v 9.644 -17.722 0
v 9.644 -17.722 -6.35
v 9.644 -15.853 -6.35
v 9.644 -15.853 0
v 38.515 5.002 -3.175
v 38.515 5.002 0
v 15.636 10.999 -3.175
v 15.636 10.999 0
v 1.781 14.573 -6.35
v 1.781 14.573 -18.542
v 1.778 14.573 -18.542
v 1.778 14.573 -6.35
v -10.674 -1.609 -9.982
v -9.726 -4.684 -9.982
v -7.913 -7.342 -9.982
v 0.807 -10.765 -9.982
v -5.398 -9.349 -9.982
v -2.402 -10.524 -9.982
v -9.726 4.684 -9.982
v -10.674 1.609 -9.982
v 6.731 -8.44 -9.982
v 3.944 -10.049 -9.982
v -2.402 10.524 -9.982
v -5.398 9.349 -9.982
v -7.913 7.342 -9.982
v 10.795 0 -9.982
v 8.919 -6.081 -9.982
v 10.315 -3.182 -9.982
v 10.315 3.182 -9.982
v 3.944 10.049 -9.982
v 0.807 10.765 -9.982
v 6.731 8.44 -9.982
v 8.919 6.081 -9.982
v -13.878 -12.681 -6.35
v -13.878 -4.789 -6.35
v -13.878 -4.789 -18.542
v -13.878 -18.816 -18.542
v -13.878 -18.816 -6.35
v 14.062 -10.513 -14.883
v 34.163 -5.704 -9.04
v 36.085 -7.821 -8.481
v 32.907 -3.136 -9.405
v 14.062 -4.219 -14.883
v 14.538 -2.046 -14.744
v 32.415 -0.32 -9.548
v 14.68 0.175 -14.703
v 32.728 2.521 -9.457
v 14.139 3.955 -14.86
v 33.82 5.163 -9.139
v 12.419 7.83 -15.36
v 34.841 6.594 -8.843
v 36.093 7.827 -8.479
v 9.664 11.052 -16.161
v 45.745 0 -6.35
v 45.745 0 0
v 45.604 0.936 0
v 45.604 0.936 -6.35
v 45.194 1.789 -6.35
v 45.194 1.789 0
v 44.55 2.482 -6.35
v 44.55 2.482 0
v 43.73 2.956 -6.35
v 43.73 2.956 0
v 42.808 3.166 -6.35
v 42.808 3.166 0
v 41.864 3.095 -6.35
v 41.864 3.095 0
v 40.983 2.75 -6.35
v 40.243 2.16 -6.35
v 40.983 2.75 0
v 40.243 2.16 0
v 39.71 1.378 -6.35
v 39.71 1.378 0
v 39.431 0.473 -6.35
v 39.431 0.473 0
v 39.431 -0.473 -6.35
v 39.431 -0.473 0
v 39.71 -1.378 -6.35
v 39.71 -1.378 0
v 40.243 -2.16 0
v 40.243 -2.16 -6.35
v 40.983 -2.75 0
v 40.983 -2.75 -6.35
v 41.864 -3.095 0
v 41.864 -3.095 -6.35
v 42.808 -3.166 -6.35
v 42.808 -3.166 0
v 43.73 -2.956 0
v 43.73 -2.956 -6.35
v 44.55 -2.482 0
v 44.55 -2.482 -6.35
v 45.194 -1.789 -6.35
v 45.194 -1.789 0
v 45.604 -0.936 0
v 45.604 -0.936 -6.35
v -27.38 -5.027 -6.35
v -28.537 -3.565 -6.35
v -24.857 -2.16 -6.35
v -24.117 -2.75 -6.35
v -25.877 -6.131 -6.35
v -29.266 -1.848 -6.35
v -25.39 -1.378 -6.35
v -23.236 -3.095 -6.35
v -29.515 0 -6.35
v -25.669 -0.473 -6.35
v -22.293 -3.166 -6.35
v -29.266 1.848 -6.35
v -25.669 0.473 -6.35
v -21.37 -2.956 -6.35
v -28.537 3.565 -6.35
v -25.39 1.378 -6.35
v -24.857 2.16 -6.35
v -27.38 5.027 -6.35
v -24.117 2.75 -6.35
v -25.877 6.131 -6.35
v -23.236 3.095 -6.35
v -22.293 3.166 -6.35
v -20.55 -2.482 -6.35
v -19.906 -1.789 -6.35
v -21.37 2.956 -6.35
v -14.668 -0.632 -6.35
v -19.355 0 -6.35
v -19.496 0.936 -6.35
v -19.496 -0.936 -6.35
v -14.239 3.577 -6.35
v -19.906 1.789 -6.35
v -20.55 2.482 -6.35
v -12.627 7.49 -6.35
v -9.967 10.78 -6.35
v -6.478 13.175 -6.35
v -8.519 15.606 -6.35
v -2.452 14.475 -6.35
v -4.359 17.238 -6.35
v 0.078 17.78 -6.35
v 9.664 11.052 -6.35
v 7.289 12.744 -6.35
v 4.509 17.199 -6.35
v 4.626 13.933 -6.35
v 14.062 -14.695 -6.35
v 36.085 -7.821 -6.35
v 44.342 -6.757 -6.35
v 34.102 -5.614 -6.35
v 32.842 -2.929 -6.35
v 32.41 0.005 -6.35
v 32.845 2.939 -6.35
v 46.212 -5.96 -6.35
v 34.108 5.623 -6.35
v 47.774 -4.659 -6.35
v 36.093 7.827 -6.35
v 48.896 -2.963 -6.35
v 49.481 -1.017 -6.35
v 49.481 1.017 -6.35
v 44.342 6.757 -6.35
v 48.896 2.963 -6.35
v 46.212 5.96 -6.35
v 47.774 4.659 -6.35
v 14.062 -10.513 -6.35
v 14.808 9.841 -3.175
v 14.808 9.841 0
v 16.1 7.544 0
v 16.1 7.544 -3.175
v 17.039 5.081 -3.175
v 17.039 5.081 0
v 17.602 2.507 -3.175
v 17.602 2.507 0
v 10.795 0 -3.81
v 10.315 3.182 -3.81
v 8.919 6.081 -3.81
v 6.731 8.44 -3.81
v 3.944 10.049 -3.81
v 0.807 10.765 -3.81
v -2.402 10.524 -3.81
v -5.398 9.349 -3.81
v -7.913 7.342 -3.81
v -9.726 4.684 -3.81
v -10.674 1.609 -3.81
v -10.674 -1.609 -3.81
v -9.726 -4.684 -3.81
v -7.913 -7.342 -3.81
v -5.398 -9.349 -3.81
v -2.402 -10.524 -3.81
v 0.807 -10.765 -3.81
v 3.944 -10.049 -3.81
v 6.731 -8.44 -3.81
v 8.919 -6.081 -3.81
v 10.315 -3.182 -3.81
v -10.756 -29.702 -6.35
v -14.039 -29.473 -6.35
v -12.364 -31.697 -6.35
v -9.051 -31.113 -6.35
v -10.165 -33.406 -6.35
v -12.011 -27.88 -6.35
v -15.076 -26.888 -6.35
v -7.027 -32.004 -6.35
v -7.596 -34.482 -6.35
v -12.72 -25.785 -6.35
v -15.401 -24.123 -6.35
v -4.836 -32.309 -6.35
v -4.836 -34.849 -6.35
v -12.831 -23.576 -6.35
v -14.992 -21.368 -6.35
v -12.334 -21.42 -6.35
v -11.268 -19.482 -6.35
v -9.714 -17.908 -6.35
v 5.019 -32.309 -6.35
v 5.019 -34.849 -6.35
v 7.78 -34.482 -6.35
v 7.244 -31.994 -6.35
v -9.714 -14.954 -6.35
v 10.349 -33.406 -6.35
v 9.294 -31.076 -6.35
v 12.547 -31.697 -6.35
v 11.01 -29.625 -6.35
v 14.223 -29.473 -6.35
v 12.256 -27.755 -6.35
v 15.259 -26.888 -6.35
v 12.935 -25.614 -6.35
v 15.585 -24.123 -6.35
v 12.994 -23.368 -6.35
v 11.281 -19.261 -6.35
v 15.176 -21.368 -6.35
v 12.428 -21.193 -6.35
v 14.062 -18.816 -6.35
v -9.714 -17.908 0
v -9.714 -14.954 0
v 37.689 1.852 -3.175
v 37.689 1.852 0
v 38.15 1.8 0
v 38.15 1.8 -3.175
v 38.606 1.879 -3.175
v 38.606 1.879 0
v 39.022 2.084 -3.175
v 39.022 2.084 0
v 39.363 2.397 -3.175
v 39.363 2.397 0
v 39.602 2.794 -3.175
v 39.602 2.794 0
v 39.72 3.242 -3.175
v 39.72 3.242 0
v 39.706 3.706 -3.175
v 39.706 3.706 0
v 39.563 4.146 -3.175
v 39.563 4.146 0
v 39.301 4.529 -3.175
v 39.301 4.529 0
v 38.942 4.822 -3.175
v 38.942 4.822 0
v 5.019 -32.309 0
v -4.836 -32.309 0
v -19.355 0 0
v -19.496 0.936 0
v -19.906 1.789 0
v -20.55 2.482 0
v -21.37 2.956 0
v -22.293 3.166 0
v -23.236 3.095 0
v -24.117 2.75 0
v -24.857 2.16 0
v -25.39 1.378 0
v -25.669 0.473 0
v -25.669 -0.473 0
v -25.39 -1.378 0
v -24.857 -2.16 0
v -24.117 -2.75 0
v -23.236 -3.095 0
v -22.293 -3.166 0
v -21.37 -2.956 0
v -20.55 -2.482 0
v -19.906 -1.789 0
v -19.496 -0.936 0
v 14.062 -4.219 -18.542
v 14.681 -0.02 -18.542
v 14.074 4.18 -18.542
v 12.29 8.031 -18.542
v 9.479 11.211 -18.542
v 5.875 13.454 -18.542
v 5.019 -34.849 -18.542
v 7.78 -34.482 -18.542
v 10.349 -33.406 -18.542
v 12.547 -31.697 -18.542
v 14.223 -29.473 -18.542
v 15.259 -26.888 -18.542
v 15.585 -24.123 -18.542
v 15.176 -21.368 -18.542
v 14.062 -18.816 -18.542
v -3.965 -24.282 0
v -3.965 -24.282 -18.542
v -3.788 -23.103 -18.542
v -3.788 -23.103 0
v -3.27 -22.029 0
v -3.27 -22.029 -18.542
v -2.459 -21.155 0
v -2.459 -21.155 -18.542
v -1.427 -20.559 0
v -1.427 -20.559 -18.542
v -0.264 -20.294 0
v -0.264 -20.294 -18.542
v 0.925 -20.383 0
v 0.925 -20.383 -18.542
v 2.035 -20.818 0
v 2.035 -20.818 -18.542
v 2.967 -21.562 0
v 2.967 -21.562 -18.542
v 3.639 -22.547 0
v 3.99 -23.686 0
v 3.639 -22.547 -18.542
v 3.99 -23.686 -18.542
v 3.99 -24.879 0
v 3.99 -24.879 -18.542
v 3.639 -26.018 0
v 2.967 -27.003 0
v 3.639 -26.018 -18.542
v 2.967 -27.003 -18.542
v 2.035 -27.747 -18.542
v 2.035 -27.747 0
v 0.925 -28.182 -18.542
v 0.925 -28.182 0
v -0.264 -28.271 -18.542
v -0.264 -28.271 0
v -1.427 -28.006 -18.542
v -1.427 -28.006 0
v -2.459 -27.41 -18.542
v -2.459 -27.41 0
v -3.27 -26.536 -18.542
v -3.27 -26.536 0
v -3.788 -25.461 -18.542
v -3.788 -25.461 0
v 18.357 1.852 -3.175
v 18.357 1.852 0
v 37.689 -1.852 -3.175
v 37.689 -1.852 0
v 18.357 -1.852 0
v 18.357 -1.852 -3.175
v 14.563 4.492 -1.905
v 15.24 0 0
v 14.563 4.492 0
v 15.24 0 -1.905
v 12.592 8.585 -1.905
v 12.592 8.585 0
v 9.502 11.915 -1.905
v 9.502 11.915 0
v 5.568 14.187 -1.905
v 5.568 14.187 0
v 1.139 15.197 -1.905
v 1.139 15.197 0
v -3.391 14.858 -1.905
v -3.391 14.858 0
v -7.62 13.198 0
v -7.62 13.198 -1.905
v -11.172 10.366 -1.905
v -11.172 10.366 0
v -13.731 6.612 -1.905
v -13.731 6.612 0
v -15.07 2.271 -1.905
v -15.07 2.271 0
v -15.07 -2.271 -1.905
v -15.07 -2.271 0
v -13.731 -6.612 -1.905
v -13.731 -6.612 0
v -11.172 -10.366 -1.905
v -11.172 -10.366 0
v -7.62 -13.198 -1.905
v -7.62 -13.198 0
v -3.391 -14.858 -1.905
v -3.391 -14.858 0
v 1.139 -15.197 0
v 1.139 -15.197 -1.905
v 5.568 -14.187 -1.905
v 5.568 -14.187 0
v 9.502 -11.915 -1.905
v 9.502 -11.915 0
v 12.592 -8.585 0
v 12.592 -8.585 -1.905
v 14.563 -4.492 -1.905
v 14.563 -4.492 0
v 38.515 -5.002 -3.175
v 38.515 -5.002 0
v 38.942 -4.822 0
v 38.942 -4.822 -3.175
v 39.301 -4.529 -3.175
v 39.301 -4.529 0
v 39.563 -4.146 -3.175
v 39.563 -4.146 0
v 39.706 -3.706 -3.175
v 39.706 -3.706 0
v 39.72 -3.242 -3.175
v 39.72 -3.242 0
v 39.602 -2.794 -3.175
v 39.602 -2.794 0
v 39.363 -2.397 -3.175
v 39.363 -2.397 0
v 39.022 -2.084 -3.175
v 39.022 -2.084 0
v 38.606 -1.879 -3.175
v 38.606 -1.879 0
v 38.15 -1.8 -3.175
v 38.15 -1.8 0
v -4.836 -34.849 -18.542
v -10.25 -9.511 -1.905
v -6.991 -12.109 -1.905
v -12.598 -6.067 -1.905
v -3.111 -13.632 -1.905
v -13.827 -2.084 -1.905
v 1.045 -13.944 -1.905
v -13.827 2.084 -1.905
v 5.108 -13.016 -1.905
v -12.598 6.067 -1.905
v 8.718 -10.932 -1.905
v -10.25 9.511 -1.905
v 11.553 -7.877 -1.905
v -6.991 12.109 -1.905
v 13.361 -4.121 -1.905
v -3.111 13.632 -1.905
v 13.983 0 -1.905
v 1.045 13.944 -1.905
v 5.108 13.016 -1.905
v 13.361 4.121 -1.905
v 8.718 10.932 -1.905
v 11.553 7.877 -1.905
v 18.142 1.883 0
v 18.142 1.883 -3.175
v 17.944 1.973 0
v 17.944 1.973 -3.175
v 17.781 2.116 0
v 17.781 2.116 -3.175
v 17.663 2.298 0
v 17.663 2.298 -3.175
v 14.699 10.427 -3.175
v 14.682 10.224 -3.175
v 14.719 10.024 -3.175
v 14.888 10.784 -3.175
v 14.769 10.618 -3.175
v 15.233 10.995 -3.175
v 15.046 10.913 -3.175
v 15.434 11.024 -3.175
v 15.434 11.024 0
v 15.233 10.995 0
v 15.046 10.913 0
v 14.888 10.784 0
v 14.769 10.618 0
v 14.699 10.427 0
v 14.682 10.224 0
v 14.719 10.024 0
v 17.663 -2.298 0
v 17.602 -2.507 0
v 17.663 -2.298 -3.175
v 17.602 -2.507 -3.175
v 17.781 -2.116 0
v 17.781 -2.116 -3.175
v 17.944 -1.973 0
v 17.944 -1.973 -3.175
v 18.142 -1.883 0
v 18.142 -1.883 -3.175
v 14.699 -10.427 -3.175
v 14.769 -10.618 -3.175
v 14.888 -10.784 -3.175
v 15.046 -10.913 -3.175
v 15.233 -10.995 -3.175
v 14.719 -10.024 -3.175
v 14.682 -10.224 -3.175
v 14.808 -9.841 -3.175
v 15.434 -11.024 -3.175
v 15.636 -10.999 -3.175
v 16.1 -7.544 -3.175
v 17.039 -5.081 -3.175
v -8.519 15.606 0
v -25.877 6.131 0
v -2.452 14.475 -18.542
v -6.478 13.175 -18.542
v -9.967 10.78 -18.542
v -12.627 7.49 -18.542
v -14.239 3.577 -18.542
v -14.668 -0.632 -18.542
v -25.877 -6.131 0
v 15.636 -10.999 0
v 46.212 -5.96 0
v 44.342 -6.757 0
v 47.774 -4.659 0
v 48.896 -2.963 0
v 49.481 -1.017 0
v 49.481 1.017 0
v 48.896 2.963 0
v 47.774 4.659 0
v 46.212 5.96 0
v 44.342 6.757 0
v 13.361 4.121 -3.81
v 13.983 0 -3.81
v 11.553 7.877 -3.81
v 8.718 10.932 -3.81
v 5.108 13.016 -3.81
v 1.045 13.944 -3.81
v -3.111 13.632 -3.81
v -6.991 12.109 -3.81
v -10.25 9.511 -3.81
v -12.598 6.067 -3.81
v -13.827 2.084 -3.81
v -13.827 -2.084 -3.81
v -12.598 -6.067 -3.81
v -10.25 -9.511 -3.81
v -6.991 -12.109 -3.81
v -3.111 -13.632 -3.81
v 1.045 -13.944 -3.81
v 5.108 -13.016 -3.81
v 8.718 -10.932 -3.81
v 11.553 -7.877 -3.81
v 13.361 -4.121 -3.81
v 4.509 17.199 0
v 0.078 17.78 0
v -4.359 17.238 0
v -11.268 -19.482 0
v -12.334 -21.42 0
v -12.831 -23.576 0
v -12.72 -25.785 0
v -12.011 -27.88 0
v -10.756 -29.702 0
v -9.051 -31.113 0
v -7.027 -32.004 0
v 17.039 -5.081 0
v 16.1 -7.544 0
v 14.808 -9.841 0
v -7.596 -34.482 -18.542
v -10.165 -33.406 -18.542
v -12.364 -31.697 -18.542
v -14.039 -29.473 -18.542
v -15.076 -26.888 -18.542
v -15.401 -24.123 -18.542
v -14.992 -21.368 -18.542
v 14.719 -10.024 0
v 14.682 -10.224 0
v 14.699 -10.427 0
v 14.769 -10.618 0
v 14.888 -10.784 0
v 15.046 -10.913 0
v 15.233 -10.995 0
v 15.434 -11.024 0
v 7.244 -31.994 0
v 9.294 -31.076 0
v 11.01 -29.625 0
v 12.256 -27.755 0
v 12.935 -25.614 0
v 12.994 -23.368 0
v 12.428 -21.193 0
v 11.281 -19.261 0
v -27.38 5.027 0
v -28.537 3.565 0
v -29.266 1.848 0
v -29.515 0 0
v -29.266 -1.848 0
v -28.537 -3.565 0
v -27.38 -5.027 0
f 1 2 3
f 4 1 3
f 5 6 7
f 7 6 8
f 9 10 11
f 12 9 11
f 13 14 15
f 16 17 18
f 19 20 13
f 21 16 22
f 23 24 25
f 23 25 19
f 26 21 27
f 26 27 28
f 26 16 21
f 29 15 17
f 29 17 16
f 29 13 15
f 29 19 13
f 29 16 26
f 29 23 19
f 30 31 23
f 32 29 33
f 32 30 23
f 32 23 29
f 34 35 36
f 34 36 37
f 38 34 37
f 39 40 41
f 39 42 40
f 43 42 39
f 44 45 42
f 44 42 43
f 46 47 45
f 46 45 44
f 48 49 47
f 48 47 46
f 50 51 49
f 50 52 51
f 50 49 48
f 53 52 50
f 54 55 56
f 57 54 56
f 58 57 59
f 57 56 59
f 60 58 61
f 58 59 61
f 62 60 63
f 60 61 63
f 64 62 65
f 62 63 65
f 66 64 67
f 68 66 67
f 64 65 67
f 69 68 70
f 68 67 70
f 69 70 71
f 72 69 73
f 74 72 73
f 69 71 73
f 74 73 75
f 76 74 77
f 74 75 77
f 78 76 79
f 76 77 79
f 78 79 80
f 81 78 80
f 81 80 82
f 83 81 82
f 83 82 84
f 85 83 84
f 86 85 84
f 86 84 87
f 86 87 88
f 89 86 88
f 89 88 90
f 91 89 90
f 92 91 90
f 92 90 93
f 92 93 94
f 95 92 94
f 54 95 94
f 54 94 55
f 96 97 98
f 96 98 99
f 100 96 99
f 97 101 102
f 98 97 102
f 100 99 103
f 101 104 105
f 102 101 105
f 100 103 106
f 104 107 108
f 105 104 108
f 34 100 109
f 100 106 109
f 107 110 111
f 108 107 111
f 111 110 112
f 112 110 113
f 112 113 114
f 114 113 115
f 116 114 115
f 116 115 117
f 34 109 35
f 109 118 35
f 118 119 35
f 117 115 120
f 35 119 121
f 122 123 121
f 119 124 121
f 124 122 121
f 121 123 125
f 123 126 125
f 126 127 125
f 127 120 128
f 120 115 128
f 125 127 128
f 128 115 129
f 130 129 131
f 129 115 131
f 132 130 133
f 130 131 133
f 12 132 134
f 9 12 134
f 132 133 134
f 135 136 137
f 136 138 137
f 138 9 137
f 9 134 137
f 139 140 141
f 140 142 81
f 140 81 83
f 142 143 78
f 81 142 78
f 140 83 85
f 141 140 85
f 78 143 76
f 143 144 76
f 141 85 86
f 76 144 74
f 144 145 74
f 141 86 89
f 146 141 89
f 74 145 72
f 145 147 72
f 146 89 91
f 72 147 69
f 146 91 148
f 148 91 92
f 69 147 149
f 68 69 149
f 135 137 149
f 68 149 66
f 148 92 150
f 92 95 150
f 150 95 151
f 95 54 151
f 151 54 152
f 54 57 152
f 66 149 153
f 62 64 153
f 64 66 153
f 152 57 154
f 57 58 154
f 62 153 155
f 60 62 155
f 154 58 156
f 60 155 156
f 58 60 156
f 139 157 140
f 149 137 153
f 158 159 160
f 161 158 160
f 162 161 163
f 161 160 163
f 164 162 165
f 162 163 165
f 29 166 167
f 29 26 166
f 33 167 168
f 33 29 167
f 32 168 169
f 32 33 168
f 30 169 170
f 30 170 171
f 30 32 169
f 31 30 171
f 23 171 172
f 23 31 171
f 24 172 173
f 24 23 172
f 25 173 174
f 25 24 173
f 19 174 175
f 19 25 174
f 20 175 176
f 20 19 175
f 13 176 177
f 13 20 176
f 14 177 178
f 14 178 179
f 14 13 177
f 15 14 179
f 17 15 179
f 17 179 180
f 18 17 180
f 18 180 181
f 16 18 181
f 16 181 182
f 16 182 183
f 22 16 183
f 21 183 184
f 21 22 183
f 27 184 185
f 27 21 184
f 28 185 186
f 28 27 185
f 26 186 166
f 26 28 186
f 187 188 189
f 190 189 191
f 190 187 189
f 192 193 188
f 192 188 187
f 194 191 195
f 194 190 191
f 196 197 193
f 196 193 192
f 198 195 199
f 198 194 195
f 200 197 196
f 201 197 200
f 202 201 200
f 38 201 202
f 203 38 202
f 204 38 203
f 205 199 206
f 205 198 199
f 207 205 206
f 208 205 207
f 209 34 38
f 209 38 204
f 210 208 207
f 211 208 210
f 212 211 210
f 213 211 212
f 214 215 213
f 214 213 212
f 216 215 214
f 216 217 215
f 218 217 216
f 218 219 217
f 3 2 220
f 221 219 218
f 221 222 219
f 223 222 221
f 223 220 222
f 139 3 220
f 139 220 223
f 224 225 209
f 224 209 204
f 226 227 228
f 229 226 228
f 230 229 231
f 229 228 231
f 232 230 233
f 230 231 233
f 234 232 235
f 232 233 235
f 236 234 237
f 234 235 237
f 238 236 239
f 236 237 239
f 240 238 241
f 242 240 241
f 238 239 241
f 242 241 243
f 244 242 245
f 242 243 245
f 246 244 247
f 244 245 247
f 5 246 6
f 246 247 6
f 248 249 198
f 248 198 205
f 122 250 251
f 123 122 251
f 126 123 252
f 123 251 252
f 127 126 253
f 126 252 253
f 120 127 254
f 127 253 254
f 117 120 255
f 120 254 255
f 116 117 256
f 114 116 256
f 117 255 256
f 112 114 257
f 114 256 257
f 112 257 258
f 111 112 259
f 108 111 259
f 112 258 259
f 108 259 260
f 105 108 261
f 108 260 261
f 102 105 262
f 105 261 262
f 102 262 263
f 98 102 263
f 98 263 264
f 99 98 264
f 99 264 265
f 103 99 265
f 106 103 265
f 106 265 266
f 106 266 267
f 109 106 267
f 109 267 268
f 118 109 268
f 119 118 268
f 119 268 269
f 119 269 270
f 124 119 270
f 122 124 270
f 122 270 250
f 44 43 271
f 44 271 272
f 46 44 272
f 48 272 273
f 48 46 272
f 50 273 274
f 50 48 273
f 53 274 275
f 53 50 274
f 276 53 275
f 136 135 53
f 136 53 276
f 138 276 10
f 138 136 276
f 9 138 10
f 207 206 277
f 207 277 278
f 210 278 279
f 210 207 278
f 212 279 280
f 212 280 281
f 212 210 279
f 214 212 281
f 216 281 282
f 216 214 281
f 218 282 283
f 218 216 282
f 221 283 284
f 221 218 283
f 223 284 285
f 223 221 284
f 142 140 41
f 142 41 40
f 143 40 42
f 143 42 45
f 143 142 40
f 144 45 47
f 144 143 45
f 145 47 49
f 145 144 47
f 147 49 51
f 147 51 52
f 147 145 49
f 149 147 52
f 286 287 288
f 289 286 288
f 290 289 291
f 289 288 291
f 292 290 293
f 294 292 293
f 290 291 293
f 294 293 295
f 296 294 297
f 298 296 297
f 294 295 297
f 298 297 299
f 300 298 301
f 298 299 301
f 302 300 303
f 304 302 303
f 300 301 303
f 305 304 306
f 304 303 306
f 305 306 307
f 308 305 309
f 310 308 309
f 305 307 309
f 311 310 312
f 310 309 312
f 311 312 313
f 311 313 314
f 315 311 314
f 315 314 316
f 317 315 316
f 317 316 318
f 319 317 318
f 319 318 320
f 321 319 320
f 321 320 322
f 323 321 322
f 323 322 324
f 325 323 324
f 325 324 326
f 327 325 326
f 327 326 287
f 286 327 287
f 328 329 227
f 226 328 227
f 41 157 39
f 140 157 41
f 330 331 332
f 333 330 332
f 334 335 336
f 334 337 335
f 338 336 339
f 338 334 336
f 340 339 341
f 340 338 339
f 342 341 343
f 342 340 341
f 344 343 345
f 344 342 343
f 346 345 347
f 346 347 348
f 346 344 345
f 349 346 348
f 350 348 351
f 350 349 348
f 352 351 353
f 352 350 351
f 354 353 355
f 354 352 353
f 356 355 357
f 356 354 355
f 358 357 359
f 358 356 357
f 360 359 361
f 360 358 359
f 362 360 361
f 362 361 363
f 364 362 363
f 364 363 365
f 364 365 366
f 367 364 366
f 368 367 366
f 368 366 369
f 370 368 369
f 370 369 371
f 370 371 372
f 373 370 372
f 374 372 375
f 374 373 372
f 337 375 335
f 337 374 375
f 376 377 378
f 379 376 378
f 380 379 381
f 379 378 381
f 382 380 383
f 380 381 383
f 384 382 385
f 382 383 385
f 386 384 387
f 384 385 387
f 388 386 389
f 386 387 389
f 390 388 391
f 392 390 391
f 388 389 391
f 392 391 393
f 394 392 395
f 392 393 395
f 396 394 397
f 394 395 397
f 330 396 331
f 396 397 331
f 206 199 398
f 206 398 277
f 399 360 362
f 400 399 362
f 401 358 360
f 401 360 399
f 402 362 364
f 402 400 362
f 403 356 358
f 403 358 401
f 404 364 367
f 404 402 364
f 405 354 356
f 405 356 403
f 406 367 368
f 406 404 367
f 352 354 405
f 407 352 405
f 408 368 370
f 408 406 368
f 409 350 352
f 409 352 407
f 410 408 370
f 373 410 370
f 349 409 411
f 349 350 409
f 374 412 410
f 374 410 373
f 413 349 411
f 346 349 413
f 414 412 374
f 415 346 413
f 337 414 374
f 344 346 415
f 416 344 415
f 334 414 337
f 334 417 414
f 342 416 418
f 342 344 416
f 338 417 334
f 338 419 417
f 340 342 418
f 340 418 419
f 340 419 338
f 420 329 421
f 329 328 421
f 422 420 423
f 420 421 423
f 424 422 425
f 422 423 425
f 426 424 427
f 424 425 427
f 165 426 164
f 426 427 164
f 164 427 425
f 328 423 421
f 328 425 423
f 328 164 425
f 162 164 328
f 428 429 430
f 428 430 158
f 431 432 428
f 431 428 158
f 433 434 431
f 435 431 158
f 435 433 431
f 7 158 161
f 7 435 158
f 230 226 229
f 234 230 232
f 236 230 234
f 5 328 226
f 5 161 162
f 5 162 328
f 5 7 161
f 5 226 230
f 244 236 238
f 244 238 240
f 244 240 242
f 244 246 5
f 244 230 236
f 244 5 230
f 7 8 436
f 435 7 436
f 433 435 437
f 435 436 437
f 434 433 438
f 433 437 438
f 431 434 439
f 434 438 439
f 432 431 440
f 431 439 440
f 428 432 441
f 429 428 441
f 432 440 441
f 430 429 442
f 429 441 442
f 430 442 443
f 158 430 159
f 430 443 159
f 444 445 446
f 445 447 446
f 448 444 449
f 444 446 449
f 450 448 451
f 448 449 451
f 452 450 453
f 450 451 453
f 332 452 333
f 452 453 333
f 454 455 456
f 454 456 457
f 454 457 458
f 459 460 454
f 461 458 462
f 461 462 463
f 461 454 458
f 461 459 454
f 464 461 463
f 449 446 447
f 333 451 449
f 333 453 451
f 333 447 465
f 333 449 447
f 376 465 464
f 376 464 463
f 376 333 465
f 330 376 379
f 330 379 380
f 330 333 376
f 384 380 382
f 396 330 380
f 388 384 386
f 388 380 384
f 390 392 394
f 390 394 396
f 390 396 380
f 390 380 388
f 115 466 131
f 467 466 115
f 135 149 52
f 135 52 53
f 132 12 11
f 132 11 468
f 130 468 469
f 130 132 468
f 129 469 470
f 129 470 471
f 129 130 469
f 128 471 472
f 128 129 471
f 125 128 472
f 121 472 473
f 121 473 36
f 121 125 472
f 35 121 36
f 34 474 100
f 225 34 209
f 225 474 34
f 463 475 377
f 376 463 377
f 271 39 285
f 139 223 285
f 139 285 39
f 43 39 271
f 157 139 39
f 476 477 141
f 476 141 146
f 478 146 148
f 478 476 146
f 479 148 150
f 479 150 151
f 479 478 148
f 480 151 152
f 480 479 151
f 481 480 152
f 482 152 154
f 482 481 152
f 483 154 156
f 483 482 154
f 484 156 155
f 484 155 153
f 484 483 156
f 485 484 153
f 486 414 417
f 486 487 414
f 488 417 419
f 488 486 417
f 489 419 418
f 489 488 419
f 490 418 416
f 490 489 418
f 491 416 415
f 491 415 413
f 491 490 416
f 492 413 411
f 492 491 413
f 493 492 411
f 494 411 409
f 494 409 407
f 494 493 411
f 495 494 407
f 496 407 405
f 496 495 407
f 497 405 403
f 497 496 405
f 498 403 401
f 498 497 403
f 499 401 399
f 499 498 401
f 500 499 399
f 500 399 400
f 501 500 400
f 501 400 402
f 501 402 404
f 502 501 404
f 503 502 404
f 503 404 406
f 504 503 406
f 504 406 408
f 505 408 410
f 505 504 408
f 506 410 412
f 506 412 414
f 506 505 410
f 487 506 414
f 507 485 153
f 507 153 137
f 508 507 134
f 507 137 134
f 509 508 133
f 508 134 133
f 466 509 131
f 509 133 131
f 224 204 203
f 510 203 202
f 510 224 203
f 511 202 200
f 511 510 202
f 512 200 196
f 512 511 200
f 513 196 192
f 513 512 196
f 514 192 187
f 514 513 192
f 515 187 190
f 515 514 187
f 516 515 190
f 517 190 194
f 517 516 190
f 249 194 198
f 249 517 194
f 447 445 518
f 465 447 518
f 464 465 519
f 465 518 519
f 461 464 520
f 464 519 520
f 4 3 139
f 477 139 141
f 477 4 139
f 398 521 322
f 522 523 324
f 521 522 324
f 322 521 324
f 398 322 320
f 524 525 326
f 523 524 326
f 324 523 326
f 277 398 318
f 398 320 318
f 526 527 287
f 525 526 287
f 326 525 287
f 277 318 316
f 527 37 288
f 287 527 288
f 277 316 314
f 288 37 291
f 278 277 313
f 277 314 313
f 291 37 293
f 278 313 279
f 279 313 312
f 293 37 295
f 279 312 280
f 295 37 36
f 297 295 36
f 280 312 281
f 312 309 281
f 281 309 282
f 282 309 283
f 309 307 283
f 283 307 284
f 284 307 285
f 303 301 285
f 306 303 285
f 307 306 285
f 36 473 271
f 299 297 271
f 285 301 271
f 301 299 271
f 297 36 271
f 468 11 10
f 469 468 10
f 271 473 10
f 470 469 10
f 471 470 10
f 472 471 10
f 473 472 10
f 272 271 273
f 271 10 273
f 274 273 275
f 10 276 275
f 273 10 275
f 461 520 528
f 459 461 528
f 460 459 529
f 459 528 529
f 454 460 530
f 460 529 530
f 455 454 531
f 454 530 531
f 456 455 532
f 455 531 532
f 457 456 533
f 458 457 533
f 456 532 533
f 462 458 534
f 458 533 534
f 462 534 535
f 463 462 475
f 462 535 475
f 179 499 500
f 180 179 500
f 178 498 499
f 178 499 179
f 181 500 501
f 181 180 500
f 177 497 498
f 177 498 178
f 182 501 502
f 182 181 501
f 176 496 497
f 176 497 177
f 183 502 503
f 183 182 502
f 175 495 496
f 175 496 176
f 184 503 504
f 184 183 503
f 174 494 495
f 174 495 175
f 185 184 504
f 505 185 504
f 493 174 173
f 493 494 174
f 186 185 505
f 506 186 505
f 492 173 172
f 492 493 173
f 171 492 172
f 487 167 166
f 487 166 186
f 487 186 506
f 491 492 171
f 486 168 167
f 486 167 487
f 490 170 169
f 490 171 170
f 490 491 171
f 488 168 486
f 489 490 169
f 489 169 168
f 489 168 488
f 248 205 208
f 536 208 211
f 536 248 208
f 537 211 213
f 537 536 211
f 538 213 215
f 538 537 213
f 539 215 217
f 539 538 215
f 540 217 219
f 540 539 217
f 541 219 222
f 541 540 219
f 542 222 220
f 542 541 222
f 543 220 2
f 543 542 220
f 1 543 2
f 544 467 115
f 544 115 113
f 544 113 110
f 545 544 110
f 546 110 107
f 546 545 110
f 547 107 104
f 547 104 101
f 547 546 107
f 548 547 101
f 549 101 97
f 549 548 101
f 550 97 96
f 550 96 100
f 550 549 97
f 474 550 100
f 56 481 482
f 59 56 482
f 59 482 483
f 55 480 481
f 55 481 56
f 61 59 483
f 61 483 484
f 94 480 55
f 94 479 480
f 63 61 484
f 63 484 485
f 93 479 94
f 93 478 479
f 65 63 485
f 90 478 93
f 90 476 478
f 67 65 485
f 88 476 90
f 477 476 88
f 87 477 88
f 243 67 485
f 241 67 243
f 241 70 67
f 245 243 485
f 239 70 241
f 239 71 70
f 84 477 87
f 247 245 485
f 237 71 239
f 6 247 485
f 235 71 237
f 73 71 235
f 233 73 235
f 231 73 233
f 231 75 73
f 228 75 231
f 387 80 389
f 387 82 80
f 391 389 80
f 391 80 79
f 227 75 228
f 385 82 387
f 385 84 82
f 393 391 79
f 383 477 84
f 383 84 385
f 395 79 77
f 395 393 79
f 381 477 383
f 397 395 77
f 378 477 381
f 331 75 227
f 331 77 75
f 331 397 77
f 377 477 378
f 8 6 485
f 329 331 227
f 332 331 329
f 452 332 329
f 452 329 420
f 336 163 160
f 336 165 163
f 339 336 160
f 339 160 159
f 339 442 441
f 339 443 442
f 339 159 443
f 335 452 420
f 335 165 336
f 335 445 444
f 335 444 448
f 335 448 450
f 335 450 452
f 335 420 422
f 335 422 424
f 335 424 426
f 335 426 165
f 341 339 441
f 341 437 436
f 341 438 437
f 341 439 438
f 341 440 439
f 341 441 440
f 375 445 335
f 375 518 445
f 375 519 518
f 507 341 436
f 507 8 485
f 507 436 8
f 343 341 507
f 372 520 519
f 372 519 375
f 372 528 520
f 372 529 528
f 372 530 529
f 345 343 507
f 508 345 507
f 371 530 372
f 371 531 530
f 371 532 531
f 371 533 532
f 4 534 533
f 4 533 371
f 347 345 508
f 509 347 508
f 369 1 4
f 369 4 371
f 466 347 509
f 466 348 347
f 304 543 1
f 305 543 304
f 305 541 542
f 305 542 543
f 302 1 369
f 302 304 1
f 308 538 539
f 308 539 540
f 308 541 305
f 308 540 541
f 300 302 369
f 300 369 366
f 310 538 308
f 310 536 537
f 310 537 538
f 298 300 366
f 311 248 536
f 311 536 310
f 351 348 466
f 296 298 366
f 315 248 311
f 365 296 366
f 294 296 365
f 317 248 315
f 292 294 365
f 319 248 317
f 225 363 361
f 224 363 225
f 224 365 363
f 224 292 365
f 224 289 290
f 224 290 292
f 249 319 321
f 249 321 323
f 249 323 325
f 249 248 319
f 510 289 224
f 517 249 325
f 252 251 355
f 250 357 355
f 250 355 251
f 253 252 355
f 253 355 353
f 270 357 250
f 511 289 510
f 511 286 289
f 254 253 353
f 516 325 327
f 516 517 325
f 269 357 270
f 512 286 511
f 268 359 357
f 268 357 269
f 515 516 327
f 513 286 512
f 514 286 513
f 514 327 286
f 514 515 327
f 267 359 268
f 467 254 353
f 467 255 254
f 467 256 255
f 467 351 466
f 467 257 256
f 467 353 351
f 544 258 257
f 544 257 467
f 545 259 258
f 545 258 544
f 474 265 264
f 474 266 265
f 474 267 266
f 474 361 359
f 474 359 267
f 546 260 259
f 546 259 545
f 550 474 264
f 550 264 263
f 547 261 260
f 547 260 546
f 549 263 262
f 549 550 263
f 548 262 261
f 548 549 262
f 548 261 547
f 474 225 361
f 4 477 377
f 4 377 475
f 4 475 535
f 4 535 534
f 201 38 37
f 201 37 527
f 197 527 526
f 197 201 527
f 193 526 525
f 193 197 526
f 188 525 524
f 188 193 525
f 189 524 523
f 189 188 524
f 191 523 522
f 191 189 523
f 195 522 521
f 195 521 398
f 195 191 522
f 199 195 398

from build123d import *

# Parameters (mm, degrees)
BOSS_EXTRUDE1_DEPTH      = 6.35
BOSS_EXTRUDE2_DEPTH      = 12.192
BOSS_EXTRUDE3_REACH      = 63.797
CUT_EXTRUDE1_DEPTH       = 3.175
CUT_EXTRUDE2_DEPTH       = 3.175
F_8_0_8_DIAMETER_HOLE1_D = 8
HOLE1_D                  = 6.35
CHAMFER1_SIZE            = 3.256138018
CHAMFER2_SIZE            = 2.651435284
FILLET1_R                = 0.762
FILLET2_R                = 17.78


with BuildPart() as part:
    # Sketch1 → Boss-Extrude1 (new body)
    with BuildSketch(Plane.XY):
        with BuildLine():
            Line((-25.876615107, -6.130991244), (-6.855570788, -16.51429077))
            ThreePointArc((-6.855570788, -16.51429077), (-12.797339629, -25.300522195), (-4.835774214, -32.308799856))
            Line((-4.835774214, -32.308799856), (5.019425786, -32.308799856))
            ThreePointArc((5.019425786, -32.308799856), (12.97831912, -25.32120391), (7.079560008, -16.524890981))
            Line((7.079560008, -16.524890981), (44.341655967, -6.756691298))
            ThreePointArc((44.341655967, -6.756691298), (49.5554, 0), (44.341655967, 6.756691298))
            Line((44.341655967, 6.756691298), (-2.321508902, 18.989366367))
            Line((-2.321508902, 18.989366367), (-25.876615107, 6.130991244))
            ThreePointArc((-25.876615107, 6.130991244), (-29.5148, 0), (-25.876615107, -6.130991244))
        make_face()
    extrude(amount=-BOSS_EXTRUDE1_DEPTH)

    # Sketch2 → Boss-Extrude2 (add)
    with BuildSketch(Plane(origin=(0, 0, -6.35), x_dir=(-1, 0, 0), z_dir=(0, 0, -1))):
        with BuildLine():
            Line((4.835774214, -34.848799856), (-5.019425786, -34.848799856))
            ThreePointArc((-5.019425786, -34.848799856), (-14.222989868, -29.47308547), (-14.061825786, -18.815791108))
            Line((-14.061825786, -18.815791108), (-14.061825783, -4.219323287))
            ThreePointArc((-14.061825783, -4.219323287), (-12.289675842, 8.031282652), (-1.781242501, 14.572741966))
            Line((-1.781242501, 14.572741966), (-1.778349168, 14.573095333))
            ThreePointArc((-1.778349168, 14.573095333), (11.415932367, 9.231149524), (13.878174214, -4.788936617))
            Line((13.878174214, -4.788936617), (13.878174214, -18.815791108))
            ThreePointArc((13.878174214, -18.815791108), (14.039338296, -29.47308547), (4.835774214, -34.848799856))
        make_face()
    extrude(amount=BOSS_EXTRUDE2_DEPTH)

    # Boss-Extrude3: up to this plane
    boss_extrude3_end = Plane(origin=(5.084615624, 0, -17.49223415), z_dir=(0.2791253467698281, 0, -0.9602546749642114))
    # Sketch4 → Boss-Extrude3 (add, up to the surface)
    with BuildSketch(Plane(origin=(0, 0, -6.35), x_dir=(-1, 0, 0), z_dir=(0, 0, -1)), mode=Mode.PRIVATE) as boss_extrude3_sk1:
        with BuildLine():
            Line((-36.092721498, 7.827214142), (-9.663817118, 11.052070939))
            ThreePointArc((-9.663817118, 11.052070939), (-14.107813549, 4.062909083), (-14.061825786, -4.219323276))
            Line((-14.061825786, -4.219323276), (-14.061825786, -10.512648454))
            Line((-14.061825786, -10.512648454), (-36.084688558, -7.820559257))
            ThreePointArc((-36.084688558, -7.820559257), (-32.410401339, 0.005215736), (-36.092721498, 7.827214142))
        make_face()
    boss_extrude3_tool1 = split(extrude(boss_extrude3_sk1.sketch, amount=BOSS_EXTRUDE3_REACH, mode=Mode.PRIVATE), bisect_by=boss_extrude3_end, keep=Keep.BOTH, mode=Mode.PRIVATE)
    add(boss_extrude3_tool1.solids().sort_by_distance((23.208362, 0.258221, -6.35))[0])

    # Sketch5 → Cut-Extrude1 (cut)
    with BuildSketch(Plane.XY):
        with BuildLine():
            Line((17.683274588, 1.852079867), (37.689391665, 1.852079867))
            ThreePointArc((37.689391665, 1.852079867), (39.677118992, 3.014104647), (38.515094212, 5.001831974))
            Line((38.515094212, 5.001831974), (15.636334606, 10.999462718))
            ThreePointArc((15.636334606, 10.999462718), (14.82307645, 10.705321164), (14.808458463, 9.840627925))
            ThreePointArc((14.808458463, 9.840627925), (16.729686315, 6.020464751), (17.683274588, 1.852079867))
        make_face()
    extrude(amount=-CUT_EXTRUDE1_DEPTH, mode=Mode.SUBTRACT)

    # Sketch6 → Cut-Extrude2 (cut)
    with BuildSketch(Plane.XY):
        with BuildLine():
            Line((15.636334606, -10.999462718), (38.515094212, -5.001831974))
            ThreePointArc((38.515094212, -5.001831974), (39.677118992, -3.014104647), (37.689391665, -1.852079867))
            Line((37.689391665, -1.852079867), (17.683274588, -1.852079867))
            ThreePointArc((17.683274588, -1.852079867), (16.729686315, -6.020464751), (14.808458463, -9.840627925))
            ThreePointArc((14.808458463, -9.840627925), (14.82307645, -10.705321164), (15.636334606, -10.999462718))
        make_face()
    extrude(amount=-CUT_EXTRUDE2_DEPTH, mode=Mode.SUBTRACT)

    # Sketch7 → Cut-Revolve1 (revolve, cut)
    with BuildSketch(Plane(origin=(0, 0, 0), x_dir=(1, 0, 0), z_dir=(0, 1, 0))):
        Polygon((10.795, 9.9822), (0, 9.9822), (0, 0), (15.24, 0), (15.24, 1.905), (13.9827, 1.905), (13.9827, 3.81), (10.795, 3.81), align=None)
    revolve(axis=Axis((0, 0, -9.9822), (0, 0, 1)), mode=Mode.SUBTRACT)

    # Ø8.0 (8) Diameter Hole1 (through all)
    with Locations(Plane.XY):
        with Locations((0.034636225, -24.282399856)):
            Hole(F_8_0_8_DIAMETER_HOLE1_D / 2)

    # Hole1 (through all)
    with Locations(Plane(origin=(0, 0, -6.35), x_dir=(-1, 0, 0), z_dir=(0, 0, -1))):
        with Locations((-42.5704, 0), (22.5298, 0)):
            Hole(HOLE1_D / 2)

    # Chamfer1
    # the kernel refuses this chamfer: 3.256138018, 2.953062062 mm, written as the material it adds along each edge
    with BuildSketch(Plane(origin=(-6.855570788, -16.51429077, 0), x_dir=(-0.8777367565349716, 0.4791431792559171, 0), z_dir=(0, 0, -1))) as chamfer1_piece_1:
        with BuildLine():
            Line((CHAMFER1_SIZE, 0), (1.840697413, -2.592929003))
            ThreePointArc((1.840697413, -2.592929003), (1.066981917, -1.228355945), (0, 0))
            Line((0, 0), (CHAMFER1_SIZE, 0))
        make_face()
    extrude(amount=14.651282068)

    # Chamfer2
    # the kernel refuses this chamfer: 2.653671842, 2.651435284 mm, written as the material it adds along each edge
    with BuildSketch(Plane(origin=(7.079560008, -16.524890981, 0), x_dir=(0.9060971467141865, -0.4230696877778058, 0), z_dir=(0, 0, -1))) as chamfer2_piece_1:
        with BuildLine():
            Line((2.830570234, 0), (CHAMFER2_SIZE * 0.769198854398, -CHAMFER2_SIZE * 0.639009485396))
            Line((CHAMFER2_SIZE * 0.769198854398, -CHAMFER2_SIZE * 0.639009485396), (0, 0))
            ThreePointArc((0, 0), (1.438235904, -0.125730188), (2.830570234, 0))
        make_face()
    extrude(amount=13.542714548)

    # Fillet1
    fillet1_edges = [part.edges().sort_by_distance(p)[0] for p in [
        (17.683274588, 1.852079867, -1.5875),
        (17.683274588, -1.852079867, -1.5875),
    ]]
    fillet(fillet1_edges, radius=FILLET1_R)

    # Fillet2
    fillet2_edges = [part.edges().sort_by_distance(p)[0] for p in [
        (-2.321508902, 18.989366367, -3.175),
    ]]
    fillet(fillet2_edges, radius=FILLET2_R)


solid = part.part
